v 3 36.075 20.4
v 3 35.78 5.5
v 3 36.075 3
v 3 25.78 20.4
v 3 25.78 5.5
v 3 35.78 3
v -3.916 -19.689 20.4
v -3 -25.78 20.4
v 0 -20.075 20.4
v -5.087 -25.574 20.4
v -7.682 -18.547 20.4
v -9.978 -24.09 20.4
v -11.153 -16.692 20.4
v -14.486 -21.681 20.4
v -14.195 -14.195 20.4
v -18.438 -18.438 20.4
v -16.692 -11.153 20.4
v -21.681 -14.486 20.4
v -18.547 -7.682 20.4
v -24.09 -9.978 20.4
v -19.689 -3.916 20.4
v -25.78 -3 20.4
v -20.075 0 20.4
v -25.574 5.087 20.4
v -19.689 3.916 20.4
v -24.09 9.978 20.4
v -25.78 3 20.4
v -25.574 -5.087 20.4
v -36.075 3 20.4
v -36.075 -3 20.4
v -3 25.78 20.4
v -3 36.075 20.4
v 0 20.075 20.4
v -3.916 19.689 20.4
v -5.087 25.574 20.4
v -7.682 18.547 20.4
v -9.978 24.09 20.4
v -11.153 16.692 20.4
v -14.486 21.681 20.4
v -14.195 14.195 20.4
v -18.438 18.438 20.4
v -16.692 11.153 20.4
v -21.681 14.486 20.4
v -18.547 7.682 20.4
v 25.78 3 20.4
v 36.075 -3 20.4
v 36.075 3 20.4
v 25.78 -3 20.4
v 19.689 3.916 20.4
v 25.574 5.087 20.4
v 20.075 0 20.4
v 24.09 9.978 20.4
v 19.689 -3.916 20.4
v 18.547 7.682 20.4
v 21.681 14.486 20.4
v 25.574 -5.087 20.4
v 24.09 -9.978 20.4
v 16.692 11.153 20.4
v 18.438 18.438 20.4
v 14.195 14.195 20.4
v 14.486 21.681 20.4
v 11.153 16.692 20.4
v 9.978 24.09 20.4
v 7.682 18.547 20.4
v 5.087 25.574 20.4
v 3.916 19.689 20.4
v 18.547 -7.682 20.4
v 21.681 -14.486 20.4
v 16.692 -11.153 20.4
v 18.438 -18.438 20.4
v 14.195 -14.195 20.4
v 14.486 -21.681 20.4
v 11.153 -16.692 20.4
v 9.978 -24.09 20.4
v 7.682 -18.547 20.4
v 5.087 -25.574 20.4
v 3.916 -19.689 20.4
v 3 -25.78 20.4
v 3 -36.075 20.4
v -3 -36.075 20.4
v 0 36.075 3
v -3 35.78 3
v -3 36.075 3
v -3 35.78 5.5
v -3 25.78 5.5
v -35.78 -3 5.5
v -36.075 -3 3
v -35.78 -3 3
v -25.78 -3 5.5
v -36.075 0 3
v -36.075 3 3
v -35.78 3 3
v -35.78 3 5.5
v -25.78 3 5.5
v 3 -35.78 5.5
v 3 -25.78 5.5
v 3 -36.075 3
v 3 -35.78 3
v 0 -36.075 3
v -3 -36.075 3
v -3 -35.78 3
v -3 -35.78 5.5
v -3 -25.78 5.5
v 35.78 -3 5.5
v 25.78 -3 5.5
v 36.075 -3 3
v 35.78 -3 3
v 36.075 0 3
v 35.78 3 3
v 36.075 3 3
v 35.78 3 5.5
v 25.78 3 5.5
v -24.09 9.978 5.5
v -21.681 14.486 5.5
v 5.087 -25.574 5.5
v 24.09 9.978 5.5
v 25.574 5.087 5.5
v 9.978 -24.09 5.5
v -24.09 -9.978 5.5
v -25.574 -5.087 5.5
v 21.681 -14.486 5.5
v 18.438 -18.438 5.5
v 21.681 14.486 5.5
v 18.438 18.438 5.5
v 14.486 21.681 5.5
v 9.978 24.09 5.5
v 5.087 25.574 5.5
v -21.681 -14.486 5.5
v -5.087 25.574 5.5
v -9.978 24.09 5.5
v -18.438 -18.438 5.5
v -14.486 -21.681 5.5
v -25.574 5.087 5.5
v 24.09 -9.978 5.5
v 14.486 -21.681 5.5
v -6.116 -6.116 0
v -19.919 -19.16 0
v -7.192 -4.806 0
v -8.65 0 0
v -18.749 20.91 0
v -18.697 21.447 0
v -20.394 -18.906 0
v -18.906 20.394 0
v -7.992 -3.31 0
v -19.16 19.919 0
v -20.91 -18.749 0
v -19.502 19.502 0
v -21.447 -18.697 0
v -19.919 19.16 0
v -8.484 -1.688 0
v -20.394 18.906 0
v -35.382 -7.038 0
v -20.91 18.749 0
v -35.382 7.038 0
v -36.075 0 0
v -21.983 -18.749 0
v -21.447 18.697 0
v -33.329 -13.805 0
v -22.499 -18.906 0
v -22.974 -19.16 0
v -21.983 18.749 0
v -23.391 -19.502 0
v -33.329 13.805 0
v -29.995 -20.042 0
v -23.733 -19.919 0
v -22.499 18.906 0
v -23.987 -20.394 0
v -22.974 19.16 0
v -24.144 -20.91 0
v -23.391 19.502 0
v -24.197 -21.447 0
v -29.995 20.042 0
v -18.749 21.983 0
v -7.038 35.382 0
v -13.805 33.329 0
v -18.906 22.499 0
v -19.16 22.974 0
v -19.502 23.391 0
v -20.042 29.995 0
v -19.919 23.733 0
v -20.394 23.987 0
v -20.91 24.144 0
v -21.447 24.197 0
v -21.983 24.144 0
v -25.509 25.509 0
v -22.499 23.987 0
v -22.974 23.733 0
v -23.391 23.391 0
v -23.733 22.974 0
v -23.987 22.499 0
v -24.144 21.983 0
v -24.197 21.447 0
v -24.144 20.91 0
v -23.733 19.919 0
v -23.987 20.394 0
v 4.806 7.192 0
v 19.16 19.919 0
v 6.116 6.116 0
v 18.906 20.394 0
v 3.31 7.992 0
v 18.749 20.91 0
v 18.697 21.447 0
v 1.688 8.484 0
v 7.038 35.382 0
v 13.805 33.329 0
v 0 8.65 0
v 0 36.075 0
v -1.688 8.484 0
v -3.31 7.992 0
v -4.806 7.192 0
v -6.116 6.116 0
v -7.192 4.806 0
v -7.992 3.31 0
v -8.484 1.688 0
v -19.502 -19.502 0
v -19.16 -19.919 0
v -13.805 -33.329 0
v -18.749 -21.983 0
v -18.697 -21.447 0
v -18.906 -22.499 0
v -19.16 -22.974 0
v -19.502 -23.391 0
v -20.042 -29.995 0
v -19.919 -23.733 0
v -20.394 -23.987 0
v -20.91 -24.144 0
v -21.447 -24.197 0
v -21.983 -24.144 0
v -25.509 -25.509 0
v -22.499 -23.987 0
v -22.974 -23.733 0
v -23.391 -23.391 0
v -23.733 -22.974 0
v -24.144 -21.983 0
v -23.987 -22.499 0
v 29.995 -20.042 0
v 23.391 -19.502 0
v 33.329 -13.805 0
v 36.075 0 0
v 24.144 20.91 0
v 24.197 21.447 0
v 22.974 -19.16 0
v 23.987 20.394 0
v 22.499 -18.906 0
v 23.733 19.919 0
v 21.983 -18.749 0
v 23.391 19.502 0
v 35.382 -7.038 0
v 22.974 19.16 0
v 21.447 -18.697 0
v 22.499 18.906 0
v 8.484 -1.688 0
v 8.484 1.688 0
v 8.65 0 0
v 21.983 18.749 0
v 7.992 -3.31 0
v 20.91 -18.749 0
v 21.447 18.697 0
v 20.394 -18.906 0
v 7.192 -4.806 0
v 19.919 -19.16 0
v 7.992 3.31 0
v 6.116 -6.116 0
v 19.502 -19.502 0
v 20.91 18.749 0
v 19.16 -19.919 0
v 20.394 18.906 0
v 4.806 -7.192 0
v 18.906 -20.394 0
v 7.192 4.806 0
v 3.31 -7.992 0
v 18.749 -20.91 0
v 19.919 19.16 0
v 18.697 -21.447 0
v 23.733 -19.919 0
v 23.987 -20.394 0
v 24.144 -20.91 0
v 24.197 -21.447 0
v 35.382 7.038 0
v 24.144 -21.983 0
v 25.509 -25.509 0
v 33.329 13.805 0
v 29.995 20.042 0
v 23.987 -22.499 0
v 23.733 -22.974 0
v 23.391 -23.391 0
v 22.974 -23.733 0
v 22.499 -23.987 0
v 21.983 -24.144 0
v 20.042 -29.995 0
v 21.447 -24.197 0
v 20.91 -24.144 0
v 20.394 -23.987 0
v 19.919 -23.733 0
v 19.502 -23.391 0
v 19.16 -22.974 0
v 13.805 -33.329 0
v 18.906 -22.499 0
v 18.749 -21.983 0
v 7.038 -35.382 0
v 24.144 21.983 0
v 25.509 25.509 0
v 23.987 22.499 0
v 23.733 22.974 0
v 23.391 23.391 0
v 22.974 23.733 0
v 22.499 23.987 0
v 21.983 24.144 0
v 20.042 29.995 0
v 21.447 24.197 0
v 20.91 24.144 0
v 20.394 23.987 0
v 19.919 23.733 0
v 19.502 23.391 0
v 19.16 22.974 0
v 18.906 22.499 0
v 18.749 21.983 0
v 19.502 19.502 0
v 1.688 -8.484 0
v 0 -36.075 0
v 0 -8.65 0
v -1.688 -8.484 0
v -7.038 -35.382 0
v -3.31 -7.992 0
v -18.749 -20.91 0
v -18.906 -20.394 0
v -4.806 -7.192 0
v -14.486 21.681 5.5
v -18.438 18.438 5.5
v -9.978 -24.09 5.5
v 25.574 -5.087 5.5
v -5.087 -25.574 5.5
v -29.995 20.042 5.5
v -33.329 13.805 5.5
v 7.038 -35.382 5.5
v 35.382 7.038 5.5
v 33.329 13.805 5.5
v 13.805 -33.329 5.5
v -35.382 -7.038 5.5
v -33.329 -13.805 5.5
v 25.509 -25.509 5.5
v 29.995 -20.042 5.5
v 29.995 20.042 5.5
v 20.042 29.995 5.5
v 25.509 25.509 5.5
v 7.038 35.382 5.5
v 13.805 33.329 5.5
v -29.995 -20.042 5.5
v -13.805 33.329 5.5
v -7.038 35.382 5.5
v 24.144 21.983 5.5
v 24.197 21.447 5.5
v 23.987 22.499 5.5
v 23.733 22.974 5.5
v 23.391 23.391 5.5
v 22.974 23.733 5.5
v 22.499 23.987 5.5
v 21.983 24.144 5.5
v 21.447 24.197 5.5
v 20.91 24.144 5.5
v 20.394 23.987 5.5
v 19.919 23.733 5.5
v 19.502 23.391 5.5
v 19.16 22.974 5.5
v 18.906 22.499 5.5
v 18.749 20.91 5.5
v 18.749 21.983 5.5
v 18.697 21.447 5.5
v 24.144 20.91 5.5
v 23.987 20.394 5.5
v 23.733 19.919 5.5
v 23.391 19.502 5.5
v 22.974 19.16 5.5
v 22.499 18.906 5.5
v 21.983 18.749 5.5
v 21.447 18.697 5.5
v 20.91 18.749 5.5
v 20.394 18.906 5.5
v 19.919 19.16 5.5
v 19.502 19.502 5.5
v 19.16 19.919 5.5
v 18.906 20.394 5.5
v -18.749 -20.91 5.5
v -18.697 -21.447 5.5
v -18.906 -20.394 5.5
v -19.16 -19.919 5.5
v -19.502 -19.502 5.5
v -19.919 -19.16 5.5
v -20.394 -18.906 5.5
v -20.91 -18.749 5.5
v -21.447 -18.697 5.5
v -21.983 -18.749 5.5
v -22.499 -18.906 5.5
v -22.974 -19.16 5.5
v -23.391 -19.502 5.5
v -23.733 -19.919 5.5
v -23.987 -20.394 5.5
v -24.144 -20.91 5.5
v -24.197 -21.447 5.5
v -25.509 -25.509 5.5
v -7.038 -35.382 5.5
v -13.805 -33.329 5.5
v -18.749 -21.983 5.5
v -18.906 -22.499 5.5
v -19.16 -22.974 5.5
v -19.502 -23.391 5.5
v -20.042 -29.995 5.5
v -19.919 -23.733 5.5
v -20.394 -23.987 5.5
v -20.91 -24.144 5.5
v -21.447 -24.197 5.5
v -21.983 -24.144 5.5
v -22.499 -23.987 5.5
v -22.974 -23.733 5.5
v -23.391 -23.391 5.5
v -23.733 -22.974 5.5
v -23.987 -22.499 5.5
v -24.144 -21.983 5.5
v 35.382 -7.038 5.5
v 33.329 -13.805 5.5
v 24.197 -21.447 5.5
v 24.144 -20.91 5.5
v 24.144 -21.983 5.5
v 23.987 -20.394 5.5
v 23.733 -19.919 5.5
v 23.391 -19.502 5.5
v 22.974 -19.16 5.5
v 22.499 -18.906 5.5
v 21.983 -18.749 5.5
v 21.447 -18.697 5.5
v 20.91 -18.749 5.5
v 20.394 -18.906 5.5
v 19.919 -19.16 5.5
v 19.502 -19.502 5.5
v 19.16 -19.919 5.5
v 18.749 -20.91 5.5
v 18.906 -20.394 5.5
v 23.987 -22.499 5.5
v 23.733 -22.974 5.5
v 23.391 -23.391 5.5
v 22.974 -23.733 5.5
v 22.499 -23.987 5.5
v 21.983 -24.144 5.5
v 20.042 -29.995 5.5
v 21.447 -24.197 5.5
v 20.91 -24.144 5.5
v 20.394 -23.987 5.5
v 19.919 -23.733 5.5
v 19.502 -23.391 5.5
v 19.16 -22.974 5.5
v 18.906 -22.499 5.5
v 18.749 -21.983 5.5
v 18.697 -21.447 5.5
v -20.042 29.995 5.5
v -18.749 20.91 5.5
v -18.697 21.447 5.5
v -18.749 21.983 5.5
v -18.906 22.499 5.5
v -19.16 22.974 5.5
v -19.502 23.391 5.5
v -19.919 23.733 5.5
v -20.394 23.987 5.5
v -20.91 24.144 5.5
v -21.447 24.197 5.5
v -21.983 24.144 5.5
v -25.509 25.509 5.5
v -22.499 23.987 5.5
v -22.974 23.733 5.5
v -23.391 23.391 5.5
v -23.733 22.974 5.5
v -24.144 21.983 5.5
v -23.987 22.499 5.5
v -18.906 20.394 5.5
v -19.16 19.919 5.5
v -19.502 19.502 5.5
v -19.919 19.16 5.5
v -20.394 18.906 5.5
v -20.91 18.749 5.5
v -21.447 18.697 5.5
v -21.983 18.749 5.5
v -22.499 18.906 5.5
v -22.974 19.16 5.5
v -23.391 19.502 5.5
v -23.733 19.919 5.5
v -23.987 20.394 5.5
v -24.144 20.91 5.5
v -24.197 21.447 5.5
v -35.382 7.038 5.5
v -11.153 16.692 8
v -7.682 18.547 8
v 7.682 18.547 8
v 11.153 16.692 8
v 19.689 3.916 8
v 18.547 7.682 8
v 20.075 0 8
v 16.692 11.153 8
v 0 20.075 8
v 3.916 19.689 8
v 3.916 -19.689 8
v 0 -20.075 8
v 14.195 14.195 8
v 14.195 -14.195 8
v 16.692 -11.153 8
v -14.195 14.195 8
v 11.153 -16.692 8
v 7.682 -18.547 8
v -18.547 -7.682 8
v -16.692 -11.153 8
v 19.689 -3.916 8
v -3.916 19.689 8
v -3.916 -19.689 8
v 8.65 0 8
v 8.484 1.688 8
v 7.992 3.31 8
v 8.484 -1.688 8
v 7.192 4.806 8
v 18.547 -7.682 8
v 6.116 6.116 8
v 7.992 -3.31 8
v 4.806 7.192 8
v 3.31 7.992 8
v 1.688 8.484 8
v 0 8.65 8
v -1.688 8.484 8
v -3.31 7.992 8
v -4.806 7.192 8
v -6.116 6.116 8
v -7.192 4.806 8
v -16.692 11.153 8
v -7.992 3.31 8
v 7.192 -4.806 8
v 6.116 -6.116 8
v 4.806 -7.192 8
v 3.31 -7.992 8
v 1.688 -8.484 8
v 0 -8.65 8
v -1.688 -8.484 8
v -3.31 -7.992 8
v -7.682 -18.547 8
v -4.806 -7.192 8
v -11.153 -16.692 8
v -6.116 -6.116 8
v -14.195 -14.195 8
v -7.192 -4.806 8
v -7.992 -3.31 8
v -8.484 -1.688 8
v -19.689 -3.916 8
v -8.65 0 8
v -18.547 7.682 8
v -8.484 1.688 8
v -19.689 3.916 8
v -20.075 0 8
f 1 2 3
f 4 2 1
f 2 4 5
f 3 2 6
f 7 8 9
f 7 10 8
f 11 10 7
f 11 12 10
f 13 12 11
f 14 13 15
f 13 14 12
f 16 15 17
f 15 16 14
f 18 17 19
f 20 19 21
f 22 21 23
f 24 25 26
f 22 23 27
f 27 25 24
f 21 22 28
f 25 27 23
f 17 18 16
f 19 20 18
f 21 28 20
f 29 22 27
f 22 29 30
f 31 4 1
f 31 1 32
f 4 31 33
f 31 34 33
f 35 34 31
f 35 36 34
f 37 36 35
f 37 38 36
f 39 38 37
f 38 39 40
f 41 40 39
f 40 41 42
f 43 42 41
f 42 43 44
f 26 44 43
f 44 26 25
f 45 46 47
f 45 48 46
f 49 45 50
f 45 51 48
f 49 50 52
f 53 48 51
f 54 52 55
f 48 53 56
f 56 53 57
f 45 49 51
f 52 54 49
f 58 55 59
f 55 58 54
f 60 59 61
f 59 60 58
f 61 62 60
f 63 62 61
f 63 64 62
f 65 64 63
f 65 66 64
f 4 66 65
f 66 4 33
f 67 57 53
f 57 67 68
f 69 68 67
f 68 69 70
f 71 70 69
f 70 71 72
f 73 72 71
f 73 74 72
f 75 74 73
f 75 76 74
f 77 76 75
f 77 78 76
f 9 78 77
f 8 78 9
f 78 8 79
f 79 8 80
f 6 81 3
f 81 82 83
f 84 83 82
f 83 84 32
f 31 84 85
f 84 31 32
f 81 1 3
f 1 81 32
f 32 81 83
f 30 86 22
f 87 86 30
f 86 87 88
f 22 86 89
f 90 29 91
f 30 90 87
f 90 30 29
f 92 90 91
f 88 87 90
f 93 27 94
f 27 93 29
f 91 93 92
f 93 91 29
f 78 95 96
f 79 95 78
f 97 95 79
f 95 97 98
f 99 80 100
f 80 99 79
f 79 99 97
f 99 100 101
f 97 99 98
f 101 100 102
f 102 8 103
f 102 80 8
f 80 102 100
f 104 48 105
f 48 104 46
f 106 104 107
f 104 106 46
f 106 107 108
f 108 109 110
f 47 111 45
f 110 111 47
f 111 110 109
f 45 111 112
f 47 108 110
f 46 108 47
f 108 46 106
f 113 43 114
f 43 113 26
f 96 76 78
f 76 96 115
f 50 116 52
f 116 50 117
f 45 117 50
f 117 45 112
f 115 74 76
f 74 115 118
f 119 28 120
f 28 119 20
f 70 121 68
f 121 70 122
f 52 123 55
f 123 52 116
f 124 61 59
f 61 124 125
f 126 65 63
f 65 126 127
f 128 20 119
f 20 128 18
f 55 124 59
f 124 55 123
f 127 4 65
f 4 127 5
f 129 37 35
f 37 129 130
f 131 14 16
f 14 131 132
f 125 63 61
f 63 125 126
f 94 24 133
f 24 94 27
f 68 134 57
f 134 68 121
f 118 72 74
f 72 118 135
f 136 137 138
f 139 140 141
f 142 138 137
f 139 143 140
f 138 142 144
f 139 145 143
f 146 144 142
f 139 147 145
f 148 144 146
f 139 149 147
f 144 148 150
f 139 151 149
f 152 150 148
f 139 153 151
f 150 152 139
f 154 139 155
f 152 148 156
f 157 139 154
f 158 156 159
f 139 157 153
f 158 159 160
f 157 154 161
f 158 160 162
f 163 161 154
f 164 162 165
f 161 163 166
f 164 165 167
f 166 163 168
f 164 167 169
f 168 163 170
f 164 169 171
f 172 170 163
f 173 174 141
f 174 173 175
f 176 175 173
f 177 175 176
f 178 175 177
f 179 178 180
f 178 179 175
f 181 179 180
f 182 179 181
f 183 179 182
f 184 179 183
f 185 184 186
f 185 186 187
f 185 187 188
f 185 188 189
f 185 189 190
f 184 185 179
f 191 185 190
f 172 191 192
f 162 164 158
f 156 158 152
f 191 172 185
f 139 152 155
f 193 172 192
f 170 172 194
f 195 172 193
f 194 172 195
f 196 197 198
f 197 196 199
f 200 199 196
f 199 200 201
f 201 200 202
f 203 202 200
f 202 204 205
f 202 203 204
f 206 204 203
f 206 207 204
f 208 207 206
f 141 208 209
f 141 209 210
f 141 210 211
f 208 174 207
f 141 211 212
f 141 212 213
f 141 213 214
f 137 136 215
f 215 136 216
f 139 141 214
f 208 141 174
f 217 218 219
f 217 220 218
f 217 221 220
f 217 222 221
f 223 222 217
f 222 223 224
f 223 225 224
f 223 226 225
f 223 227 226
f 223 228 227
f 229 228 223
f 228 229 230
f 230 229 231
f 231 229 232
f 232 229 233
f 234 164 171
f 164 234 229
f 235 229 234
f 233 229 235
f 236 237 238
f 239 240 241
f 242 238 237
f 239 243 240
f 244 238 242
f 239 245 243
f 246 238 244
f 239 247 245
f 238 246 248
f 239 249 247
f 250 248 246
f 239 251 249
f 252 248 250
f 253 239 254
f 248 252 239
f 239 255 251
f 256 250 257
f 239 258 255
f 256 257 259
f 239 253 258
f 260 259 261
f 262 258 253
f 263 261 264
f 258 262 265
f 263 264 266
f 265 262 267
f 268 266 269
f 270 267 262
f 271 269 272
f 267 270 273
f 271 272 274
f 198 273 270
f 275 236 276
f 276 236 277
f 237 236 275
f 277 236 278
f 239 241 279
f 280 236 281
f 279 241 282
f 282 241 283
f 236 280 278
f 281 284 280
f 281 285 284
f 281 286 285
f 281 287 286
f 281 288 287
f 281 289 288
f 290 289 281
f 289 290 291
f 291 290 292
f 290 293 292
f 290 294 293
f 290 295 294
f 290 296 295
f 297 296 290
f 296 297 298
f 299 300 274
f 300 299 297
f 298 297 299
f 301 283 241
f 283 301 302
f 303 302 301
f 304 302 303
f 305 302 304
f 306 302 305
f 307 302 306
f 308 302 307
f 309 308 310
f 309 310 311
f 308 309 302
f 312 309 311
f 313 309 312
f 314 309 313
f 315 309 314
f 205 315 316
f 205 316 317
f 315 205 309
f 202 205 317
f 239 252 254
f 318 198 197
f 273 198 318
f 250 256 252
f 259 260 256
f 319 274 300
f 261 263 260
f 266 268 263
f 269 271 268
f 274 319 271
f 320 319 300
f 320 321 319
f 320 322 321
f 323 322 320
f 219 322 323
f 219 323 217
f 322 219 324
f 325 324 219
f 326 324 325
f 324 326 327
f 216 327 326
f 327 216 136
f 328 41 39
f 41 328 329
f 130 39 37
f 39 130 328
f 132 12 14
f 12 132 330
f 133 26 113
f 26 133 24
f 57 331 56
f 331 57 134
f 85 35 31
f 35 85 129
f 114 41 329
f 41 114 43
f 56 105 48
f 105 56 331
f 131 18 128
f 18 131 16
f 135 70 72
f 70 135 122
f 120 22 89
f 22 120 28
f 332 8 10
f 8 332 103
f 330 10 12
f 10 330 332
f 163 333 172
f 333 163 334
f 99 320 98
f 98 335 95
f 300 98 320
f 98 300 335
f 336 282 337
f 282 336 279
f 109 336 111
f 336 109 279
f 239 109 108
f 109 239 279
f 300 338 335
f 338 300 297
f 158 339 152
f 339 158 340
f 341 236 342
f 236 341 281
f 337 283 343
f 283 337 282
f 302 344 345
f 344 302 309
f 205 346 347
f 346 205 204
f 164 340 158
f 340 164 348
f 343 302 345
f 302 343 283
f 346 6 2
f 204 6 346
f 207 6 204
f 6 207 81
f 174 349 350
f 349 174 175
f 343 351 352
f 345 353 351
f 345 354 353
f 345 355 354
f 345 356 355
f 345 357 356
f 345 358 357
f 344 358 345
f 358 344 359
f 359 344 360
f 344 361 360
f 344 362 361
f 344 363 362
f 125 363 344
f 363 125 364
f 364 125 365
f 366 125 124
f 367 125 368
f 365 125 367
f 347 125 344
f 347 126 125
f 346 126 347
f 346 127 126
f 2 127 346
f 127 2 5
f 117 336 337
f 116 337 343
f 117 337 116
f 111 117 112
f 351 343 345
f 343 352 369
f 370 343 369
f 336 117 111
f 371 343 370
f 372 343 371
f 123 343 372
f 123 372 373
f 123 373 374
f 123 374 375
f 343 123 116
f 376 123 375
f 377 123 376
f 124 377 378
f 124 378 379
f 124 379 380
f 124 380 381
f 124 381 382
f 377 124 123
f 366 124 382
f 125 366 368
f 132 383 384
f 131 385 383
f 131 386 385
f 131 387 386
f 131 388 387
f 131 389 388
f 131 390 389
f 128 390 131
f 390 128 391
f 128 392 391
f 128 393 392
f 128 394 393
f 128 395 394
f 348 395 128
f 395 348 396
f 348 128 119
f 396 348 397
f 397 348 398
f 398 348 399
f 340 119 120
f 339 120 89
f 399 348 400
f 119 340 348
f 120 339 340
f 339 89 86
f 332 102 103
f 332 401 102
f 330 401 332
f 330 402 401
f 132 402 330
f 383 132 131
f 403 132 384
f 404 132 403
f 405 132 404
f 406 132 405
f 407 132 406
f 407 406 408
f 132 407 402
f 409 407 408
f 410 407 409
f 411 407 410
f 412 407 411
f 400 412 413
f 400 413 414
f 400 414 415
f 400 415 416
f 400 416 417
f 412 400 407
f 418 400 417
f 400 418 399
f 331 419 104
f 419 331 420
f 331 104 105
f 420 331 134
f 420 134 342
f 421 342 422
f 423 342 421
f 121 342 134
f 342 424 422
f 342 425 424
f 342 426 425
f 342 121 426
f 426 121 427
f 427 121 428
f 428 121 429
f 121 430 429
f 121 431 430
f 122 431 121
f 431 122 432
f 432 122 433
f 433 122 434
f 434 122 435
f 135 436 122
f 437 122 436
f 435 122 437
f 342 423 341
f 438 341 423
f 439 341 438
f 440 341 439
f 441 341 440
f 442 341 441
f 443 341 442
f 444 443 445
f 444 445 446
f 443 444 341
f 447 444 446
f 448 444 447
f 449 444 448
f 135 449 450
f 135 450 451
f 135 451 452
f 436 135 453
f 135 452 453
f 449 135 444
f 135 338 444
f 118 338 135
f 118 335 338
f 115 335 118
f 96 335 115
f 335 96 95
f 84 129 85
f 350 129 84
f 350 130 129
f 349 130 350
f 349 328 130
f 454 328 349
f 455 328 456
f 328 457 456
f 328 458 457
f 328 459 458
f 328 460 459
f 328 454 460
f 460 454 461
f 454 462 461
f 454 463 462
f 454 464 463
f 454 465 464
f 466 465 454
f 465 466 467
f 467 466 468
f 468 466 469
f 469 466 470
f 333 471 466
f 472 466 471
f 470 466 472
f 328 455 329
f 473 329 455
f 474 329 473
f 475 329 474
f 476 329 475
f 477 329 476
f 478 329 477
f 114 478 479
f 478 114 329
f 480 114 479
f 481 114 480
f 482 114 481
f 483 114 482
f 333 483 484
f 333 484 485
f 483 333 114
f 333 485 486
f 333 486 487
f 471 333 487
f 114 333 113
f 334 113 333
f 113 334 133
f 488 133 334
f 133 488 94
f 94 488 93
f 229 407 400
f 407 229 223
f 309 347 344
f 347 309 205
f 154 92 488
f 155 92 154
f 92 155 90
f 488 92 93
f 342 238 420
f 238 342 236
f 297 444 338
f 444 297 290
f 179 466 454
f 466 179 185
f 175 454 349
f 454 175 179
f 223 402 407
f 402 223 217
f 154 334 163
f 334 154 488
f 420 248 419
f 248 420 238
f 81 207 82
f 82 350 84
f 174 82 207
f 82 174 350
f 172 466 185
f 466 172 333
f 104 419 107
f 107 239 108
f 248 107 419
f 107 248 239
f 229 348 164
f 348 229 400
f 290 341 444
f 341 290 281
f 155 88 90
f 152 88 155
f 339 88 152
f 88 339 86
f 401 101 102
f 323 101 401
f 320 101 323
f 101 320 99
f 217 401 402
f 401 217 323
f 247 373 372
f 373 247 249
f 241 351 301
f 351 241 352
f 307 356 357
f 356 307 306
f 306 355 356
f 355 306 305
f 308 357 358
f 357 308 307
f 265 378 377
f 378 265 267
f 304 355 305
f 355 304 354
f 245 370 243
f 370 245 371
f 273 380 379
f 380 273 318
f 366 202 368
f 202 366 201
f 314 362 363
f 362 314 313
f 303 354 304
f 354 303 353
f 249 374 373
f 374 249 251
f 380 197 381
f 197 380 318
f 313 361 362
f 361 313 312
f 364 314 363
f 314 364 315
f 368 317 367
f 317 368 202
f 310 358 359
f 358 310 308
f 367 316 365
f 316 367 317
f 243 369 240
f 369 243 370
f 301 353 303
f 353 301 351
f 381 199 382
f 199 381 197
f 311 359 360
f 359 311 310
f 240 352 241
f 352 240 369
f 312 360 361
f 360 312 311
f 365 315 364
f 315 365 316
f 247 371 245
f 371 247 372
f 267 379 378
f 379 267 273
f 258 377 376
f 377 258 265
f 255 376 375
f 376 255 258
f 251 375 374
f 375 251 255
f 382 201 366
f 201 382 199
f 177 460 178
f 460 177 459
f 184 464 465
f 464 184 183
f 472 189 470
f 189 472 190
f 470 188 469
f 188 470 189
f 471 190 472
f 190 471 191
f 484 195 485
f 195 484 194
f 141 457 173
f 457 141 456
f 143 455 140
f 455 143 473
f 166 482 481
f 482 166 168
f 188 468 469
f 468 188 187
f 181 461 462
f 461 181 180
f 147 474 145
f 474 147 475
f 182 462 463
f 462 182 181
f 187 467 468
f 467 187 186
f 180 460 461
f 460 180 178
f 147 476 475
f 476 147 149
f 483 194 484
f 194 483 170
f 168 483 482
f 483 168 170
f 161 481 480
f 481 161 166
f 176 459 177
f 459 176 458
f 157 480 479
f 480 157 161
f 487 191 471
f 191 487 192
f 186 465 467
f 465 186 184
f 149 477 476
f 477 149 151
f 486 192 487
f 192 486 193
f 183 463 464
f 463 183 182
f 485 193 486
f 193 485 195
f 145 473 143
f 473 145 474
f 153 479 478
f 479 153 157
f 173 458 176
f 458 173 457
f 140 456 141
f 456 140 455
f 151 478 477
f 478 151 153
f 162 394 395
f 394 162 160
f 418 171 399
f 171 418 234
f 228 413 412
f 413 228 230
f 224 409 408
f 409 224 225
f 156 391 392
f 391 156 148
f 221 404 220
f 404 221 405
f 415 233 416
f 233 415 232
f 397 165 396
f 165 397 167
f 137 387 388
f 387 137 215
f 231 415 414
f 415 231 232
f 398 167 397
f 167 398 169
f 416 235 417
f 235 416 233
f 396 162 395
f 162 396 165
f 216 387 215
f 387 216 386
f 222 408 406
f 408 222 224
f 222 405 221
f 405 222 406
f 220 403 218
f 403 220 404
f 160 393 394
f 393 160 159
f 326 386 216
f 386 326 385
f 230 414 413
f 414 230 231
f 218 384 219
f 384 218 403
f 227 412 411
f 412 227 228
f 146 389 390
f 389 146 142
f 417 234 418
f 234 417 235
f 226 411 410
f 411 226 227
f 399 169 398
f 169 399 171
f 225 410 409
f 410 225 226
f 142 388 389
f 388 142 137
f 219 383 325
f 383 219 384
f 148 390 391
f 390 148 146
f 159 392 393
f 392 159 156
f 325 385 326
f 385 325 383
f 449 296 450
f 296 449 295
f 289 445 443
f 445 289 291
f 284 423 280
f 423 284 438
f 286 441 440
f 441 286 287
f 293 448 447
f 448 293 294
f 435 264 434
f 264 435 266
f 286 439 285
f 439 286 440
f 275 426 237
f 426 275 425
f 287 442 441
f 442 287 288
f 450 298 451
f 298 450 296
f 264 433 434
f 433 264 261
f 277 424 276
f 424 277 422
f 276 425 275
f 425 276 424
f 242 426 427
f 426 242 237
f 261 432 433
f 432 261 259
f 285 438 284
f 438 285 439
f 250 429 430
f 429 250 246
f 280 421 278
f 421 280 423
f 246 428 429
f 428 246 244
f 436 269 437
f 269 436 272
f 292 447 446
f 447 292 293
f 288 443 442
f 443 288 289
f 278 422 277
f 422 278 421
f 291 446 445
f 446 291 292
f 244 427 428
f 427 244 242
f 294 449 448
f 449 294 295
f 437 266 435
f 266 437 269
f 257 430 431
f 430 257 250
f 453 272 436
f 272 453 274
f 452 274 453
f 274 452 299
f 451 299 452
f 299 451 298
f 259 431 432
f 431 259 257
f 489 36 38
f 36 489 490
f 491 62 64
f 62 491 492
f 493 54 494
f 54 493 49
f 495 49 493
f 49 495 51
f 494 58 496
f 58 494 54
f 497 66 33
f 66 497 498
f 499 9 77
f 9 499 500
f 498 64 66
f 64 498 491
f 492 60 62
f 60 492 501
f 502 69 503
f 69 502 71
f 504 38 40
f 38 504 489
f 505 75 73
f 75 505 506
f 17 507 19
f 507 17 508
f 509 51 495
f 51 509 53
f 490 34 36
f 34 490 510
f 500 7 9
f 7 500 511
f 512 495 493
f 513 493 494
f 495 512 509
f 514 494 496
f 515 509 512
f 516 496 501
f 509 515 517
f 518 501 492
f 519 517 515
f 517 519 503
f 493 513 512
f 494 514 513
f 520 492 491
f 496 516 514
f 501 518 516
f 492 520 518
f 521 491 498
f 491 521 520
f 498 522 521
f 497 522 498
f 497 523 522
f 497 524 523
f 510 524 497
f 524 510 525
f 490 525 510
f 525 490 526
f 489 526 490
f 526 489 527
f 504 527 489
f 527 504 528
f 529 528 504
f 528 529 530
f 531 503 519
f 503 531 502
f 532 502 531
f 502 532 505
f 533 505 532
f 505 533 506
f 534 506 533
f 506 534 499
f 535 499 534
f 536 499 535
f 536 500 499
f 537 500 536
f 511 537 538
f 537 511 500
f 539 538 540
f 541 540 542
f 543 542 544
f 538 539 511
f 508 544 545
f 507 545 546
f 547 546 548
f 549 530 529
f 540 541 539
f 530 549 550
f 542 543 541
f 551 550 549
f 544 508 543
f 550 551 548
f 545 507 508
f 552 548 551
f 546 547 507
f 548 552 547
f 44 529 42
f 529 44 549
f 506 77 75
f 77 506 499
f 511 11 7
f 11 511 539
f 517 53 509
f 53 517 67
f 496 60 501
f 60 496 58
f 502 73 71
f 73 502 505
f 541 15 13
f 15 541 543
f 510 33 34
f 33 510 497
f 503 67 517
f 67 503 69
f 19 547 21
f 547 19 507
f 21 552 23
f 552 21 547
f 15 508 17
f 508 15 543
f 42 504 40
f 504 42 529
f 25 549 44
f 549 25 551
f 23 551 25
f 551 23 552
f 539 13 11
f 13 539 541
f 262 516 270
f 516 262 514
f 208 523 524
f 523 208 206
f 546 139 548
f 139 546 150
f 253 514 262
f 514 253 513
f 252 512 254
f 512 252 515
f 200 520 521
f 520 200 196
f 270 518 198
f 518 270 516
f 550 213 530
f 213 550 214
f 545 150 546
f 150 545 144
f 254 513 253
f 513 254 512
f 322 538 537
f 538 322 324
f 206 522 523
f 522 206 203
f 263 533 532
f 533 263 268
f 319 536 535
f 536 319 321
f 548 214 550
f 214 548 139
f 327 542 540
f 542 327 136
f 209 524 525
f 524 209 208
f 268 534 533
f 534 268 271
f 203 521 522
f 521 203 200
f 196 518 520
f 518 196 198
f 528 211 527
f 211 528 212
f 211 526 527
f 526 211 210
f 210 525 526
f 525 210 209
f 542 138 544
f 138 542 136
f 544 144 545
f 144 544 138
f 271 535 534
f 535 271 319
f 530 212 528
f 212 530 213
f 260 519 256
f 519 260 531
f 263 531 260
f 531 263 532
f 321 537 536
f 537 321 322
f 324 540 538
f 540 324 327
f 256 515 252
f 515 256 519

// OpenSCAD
$fn = 32;

// ----------------------------------------------------------------------
// Bearing housing: seat for 6203 (40 x 12 mm), 52.15 mm body
// ----------------------------------------------------------------------

// --- parameters (mm) ---
body_od = 52.15;          // housing outside diameter
body_h = 20.4;            // overall housing height
wall = 6;                 // wall thickness
pocket_d = 40.15;         // 6203 seat, 0.15 mm clearance
seat_h = 12.4;            // pocket depth
shoulder = 4;             // shoulder under the bearing
pass_d = 17.3;            // shaft passage
flange_dia = 72.15;       // mounting flange diameter
flange_t = 4;             // flange thickness
bolt_d = 5.5;             // flange bolt clearance
bolt_r = 30.33;           // flange bolt circle radius
rib_w = 6;                // rib width
rib_n = 4;                // rib count

module body() {
  cylinder(h = body_h, d = body_od);
}

module flange() {
  /* flange sunk 1.5 mm into the body */
  cylinder(h = flange_t + 1.5, d = flange_dia);
}

module ribs() {
  for (i = [0 : rib_n - 1])
    rotate([0, 0, i * 360 / rib_n])
      translate([-rib_w / 2, body_od / 2 - 0.8, flange_t - 1])
        cube([rib_w, (flange_dia - body_od) / 2 + 0.8, body_h - flange_t + 1]);
}

difference() {
  union() {
    body();
    flange();
    ribs();
  }
  translate([0, 0, body_h - seat_h]) cylinder(h = seat_h + 1, d = pocket_d);
  translate([0, 0, -1]) cylinder(h = body_h - seat_h + 1, d = pass_d);
  for (i = [0 : 3]) rotate([0, 0, 45 + i * 90]) translate([bolt_r, 0, -1])
    cylinder(h = flange_t + 3, d = bolt_d);
}
